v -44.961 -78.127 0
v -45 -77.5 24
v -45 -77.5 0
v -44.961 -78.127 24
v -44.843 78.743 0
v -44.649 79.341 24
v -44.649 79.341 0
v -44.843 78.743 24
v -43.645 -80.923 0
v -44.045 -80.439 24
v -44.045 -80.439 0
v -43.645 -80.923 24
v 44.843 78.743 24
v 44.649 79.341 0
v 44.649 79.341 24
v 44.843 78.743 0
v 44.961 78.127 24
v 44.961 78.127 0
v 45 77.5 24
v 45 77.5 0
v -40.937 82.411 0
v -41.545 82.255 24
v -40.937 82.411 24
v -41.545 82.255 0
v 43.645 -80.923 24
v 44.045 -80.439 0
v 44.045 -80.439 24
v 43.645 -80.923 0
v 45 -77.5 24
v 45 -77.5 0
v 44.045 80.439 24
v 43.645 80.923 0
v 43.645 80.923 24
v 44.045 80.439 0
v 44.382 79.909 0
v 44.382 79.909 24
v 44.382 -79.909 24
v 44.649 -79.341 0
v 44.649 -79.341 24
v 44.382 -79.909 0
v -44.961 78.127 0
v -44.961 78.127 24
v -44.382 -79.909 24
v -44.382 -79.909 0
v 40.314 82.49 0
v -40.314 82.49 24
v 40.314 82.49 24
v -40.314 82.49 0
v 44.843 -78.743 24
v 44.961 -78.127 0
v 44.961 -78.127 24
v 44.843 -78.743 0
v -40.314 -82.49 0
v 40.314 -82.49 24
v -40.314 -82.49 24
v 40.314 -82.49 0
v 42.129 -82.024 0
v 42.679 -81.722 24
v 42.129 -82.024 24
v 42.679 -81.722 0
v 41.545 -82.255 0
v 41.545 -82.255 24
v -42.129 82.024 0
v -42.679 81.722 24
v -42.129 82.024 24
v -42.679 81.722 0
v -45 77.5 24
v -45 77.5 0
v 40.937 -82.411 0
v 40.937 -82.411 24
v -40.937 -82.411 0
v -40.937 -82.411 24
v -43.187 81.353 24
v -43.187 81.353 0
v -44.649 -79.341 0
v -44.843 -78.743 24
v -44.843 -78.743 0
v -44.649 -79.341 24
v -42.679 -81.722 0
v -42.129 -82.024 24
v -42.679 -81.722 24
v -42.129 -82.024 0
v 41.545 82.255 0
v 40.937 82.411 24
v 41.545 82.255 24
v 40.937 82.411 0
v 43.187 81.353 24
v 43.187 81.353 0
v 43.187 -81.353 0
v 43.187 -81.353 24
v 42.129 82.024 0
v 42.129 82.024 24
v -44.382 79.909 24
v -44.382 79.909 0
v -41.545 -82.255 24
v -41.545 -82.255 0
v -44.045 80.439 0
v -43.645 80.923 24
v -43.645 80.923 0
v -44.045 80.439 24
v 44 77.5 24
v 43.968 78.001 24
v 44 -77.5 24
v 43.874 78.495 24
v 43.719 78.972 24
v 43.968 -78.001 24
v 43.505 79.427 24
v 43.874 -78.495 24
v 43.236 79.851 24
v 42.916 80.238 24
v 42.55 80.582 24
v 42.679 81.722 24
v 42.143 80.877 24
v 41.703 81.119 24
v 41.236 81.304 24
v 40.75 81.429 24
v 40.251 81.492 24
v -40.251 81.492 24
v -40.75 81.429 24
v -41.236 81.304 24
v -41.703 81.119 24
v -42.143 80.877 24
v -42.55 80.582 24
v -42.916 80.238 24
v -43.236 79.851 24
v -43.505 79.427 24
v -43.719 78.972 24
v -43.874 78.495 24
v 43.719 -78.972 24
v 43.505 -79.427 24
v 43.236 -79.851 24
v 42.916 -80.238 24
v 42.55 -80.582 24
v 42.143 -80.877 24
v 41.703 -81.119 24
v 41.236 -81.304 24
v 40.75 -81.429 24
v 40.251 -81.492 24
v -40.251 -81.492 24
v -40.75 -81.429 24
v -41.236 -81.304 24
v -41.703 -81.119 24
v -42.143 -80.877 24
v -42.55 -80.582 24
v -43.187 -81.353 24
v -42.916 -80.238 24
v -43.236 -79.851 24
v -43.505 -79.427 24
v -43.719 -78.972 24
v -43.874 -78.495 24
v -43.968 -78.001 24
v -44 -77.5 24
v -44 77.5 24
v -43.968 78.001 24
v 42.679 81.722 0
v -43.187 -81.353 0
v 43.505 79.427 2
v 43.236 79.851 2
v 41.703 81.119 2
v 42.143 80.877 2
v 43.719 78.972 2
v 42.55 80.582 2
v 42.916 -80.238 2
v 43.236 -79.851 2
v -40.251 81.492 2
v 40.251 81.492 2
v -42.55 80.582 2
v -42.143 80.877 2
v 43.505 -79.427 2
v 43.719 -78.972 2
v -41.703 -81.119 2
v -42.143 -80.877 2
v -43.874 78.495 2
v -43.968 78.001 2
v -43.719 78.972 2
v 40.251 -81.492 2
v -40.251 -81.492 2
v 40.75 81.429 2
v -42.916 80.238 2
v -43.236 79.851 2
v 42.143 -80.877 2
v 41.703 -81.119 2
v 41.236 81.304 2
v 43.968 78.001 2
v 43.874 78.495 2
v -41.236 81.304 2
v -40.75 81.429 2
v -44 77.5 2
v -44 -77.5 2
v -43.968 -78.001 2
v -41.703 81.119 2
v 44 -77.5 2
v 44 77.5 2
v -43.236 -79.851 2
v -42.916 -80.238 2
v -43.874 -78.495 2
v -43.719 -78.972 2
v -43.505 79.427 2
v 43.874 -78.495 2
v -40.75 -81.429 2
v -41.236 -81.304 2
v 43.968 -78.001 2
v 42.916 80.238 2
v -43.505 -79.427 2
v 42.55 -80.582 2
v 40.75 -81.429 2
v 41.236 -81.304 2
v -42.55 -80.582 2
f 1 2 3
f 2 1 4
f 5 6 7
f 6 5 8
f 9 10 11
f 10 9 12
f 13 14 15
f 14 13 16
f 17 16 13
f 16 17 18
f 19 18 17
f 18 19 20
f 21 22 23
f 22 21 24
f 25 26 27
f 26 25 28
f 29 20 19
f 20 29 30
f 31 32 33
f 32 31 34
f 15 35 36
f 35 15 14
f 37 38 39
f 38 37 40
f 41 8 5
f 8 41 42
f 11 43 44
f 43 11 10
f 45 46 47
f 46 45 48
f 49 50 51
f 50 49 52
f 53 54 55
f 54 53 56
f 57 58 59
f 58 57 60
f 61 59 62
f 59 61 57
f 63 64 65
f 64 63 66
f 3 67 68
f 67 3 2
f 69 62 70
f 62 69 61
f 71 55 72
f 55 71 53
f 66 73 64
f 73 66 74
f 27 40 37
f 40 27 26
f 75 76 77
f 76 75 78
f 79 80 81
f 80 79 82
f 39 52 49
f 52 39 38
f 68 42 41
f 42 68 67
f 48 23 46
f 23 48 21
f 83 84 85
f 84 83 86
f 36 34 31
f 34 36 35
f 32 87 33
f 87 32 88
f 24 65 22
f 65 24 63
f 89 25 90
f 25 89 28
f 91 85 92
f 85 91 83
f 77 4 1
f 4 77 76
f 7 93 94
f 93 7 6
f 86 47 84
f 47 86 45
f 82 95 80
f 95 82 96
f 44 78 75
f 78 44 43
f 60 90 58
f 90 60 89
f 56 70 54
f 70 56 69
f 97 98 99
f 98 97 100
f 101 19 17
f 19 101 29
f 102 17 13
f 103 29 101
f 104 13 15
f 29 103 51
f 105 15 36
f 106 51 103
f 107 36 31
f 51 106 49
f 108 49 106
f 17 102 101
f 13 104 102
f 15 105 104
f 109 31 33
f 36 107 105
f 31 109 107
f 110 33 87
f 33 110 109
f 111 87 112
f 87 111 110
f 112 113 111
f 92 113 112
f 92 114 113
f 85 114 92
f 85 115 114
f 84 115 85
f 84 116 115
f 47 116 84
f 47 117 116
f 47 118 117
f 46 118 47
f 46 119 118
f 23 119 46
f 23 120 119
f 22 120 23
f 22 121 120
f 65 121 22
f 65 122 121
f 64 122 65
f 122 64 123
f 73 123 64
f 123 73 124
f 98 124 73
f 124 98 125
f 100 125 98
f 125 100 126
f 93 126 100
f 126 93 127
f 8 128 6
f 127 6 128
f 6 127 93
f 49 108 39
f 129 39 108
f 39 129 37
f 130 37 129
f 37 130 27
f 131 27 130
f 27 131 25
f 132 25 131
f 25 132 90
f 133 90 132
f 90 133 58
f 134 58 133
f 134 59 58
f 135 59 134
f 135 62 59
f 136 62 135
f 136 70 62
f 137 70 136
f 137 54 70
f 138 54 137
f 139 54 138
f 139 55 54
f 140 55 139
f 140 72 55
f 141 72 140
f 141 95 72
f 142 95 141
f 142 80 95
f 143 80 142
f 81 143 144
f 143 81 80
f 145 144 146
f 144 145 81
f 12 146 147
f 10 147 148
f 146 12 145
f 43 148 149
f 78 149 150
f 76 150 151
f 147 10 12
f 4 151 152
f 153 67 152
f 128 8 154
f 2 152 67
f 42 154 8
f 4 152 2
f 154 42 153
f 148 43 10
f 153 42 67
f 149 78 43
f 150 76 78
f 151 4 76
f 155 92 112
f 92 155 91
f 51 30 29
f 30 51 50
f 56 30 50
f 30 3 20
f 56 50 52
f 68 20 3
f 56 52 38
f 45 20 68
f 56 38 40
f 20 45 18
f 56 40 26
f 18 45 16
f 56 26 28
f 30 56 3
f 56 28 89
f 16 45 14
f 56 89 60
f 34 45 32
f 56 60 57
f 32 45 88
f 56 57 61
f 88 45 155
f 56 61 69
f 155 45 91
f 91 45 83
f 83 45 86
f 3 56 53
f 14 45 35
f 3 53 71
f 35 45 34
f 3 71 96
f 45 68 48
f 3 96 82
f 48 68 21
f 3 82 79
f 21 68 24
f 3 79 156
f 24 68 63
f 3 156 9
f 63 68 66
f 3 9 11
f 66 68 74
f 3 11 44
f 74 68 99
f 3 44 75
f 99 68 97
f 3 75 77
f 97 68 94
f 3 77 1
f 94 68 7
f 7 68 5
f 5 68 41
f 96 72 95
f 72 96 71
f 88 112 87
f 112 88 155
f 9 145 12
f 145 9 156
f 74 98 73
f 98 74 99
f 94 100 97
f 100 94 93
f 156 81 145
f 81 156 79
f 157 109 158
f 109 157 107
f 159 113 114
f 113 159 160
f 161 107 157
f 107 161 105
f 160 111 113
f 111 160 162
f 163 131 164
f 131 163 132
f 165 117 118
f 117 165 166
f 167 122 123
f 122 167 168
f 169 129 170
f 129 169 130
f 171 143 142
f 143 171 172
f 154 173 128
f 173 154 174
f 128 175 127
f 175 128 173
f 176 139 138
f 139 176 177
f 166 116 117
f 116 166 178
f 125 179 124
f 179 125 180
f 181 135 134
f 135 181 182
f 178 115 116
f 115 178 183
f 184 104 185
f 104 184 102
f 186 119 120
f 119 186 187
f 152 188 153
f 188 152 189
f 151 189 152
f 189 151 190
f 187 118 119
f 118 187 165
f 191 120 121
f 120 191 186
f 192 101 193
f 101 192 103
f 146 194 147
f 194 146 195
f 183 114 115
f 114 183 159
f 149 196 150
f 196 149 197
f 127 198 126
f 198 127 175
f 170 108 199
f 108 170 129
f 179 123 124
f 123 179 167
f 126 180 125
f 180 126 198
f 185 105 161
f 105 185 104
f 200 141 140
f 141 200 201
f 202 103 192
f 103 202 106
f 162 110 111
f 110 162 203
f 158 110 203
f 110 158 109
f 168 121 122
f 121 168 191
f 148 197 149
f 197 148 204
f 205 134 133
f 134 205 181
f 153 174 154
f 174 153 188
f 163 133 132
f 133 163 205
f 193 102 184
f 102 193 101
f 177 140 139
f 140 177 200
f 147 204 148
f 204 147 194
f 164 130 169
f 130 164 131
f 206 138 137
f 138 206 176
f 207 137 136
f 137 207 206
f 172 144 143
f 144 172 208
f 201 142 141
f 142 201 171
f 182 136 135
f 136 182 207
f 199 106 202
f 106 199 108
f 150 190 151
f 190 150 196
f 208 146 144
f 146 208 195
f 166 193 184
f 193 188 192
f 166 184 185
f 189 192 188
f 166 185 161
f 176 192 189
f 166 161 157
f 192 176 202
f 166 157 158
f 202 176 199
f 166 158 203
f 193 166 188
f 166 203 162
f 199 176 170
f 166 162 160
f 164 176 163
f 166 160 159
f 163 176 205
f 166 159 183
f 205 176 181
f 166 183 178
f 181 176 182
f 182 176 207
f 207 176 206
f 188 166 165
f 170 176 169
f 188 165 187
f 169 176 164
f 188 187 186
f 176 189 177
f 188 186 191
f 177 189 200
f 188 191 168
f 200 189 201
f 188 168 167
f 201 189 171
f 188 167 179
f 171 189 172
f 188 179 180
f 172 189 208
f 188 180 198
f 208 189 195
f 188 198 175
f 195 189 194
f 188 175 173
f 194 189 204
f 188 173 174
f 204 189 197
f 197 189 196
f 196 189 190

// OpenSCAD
$fn = 50;


difference() {
	union() {
		hull() {
			translate(v = [-40.0000000000, 77.5000000000, 0]) {
				cylinder(h = 24, r = 5);
			}
			translate(v = [40.0000000000, 77.5000000000, 0]) {
				cylinder(h = 24, r = 5);
			}
			translate(v = [-40.0000000000, -77.5000000000, 0]) {
				cylinder(h = 24, r = 5);
			}
			translate(v = [40.0000000000, -77.5000000000, 0]) {
				cylinder(h = 24, r = 5);
			}
		}
	}
	union() {
		translate(v = [0, 0, 2]) {
			hull() {
				translate(v = [-40.0000000000, 77.5000000000, 0]) {
					cylinder(h = 22, r = 4);
				}
				translate(v = [40.0000000000, 77.5000000000, 0]) {
					cylinder(h = 22, r = 4);
				}
				translate(v = [-40.0000000000, -77.5000000000, 0]) {
					cylinder(h = 22, r = 4);
				}
				translate(v = [40.0000000000, -77.5000000000, 0]) {
					cylinder(h = 22, r = 4);
				}
			}
		}
	}
}
